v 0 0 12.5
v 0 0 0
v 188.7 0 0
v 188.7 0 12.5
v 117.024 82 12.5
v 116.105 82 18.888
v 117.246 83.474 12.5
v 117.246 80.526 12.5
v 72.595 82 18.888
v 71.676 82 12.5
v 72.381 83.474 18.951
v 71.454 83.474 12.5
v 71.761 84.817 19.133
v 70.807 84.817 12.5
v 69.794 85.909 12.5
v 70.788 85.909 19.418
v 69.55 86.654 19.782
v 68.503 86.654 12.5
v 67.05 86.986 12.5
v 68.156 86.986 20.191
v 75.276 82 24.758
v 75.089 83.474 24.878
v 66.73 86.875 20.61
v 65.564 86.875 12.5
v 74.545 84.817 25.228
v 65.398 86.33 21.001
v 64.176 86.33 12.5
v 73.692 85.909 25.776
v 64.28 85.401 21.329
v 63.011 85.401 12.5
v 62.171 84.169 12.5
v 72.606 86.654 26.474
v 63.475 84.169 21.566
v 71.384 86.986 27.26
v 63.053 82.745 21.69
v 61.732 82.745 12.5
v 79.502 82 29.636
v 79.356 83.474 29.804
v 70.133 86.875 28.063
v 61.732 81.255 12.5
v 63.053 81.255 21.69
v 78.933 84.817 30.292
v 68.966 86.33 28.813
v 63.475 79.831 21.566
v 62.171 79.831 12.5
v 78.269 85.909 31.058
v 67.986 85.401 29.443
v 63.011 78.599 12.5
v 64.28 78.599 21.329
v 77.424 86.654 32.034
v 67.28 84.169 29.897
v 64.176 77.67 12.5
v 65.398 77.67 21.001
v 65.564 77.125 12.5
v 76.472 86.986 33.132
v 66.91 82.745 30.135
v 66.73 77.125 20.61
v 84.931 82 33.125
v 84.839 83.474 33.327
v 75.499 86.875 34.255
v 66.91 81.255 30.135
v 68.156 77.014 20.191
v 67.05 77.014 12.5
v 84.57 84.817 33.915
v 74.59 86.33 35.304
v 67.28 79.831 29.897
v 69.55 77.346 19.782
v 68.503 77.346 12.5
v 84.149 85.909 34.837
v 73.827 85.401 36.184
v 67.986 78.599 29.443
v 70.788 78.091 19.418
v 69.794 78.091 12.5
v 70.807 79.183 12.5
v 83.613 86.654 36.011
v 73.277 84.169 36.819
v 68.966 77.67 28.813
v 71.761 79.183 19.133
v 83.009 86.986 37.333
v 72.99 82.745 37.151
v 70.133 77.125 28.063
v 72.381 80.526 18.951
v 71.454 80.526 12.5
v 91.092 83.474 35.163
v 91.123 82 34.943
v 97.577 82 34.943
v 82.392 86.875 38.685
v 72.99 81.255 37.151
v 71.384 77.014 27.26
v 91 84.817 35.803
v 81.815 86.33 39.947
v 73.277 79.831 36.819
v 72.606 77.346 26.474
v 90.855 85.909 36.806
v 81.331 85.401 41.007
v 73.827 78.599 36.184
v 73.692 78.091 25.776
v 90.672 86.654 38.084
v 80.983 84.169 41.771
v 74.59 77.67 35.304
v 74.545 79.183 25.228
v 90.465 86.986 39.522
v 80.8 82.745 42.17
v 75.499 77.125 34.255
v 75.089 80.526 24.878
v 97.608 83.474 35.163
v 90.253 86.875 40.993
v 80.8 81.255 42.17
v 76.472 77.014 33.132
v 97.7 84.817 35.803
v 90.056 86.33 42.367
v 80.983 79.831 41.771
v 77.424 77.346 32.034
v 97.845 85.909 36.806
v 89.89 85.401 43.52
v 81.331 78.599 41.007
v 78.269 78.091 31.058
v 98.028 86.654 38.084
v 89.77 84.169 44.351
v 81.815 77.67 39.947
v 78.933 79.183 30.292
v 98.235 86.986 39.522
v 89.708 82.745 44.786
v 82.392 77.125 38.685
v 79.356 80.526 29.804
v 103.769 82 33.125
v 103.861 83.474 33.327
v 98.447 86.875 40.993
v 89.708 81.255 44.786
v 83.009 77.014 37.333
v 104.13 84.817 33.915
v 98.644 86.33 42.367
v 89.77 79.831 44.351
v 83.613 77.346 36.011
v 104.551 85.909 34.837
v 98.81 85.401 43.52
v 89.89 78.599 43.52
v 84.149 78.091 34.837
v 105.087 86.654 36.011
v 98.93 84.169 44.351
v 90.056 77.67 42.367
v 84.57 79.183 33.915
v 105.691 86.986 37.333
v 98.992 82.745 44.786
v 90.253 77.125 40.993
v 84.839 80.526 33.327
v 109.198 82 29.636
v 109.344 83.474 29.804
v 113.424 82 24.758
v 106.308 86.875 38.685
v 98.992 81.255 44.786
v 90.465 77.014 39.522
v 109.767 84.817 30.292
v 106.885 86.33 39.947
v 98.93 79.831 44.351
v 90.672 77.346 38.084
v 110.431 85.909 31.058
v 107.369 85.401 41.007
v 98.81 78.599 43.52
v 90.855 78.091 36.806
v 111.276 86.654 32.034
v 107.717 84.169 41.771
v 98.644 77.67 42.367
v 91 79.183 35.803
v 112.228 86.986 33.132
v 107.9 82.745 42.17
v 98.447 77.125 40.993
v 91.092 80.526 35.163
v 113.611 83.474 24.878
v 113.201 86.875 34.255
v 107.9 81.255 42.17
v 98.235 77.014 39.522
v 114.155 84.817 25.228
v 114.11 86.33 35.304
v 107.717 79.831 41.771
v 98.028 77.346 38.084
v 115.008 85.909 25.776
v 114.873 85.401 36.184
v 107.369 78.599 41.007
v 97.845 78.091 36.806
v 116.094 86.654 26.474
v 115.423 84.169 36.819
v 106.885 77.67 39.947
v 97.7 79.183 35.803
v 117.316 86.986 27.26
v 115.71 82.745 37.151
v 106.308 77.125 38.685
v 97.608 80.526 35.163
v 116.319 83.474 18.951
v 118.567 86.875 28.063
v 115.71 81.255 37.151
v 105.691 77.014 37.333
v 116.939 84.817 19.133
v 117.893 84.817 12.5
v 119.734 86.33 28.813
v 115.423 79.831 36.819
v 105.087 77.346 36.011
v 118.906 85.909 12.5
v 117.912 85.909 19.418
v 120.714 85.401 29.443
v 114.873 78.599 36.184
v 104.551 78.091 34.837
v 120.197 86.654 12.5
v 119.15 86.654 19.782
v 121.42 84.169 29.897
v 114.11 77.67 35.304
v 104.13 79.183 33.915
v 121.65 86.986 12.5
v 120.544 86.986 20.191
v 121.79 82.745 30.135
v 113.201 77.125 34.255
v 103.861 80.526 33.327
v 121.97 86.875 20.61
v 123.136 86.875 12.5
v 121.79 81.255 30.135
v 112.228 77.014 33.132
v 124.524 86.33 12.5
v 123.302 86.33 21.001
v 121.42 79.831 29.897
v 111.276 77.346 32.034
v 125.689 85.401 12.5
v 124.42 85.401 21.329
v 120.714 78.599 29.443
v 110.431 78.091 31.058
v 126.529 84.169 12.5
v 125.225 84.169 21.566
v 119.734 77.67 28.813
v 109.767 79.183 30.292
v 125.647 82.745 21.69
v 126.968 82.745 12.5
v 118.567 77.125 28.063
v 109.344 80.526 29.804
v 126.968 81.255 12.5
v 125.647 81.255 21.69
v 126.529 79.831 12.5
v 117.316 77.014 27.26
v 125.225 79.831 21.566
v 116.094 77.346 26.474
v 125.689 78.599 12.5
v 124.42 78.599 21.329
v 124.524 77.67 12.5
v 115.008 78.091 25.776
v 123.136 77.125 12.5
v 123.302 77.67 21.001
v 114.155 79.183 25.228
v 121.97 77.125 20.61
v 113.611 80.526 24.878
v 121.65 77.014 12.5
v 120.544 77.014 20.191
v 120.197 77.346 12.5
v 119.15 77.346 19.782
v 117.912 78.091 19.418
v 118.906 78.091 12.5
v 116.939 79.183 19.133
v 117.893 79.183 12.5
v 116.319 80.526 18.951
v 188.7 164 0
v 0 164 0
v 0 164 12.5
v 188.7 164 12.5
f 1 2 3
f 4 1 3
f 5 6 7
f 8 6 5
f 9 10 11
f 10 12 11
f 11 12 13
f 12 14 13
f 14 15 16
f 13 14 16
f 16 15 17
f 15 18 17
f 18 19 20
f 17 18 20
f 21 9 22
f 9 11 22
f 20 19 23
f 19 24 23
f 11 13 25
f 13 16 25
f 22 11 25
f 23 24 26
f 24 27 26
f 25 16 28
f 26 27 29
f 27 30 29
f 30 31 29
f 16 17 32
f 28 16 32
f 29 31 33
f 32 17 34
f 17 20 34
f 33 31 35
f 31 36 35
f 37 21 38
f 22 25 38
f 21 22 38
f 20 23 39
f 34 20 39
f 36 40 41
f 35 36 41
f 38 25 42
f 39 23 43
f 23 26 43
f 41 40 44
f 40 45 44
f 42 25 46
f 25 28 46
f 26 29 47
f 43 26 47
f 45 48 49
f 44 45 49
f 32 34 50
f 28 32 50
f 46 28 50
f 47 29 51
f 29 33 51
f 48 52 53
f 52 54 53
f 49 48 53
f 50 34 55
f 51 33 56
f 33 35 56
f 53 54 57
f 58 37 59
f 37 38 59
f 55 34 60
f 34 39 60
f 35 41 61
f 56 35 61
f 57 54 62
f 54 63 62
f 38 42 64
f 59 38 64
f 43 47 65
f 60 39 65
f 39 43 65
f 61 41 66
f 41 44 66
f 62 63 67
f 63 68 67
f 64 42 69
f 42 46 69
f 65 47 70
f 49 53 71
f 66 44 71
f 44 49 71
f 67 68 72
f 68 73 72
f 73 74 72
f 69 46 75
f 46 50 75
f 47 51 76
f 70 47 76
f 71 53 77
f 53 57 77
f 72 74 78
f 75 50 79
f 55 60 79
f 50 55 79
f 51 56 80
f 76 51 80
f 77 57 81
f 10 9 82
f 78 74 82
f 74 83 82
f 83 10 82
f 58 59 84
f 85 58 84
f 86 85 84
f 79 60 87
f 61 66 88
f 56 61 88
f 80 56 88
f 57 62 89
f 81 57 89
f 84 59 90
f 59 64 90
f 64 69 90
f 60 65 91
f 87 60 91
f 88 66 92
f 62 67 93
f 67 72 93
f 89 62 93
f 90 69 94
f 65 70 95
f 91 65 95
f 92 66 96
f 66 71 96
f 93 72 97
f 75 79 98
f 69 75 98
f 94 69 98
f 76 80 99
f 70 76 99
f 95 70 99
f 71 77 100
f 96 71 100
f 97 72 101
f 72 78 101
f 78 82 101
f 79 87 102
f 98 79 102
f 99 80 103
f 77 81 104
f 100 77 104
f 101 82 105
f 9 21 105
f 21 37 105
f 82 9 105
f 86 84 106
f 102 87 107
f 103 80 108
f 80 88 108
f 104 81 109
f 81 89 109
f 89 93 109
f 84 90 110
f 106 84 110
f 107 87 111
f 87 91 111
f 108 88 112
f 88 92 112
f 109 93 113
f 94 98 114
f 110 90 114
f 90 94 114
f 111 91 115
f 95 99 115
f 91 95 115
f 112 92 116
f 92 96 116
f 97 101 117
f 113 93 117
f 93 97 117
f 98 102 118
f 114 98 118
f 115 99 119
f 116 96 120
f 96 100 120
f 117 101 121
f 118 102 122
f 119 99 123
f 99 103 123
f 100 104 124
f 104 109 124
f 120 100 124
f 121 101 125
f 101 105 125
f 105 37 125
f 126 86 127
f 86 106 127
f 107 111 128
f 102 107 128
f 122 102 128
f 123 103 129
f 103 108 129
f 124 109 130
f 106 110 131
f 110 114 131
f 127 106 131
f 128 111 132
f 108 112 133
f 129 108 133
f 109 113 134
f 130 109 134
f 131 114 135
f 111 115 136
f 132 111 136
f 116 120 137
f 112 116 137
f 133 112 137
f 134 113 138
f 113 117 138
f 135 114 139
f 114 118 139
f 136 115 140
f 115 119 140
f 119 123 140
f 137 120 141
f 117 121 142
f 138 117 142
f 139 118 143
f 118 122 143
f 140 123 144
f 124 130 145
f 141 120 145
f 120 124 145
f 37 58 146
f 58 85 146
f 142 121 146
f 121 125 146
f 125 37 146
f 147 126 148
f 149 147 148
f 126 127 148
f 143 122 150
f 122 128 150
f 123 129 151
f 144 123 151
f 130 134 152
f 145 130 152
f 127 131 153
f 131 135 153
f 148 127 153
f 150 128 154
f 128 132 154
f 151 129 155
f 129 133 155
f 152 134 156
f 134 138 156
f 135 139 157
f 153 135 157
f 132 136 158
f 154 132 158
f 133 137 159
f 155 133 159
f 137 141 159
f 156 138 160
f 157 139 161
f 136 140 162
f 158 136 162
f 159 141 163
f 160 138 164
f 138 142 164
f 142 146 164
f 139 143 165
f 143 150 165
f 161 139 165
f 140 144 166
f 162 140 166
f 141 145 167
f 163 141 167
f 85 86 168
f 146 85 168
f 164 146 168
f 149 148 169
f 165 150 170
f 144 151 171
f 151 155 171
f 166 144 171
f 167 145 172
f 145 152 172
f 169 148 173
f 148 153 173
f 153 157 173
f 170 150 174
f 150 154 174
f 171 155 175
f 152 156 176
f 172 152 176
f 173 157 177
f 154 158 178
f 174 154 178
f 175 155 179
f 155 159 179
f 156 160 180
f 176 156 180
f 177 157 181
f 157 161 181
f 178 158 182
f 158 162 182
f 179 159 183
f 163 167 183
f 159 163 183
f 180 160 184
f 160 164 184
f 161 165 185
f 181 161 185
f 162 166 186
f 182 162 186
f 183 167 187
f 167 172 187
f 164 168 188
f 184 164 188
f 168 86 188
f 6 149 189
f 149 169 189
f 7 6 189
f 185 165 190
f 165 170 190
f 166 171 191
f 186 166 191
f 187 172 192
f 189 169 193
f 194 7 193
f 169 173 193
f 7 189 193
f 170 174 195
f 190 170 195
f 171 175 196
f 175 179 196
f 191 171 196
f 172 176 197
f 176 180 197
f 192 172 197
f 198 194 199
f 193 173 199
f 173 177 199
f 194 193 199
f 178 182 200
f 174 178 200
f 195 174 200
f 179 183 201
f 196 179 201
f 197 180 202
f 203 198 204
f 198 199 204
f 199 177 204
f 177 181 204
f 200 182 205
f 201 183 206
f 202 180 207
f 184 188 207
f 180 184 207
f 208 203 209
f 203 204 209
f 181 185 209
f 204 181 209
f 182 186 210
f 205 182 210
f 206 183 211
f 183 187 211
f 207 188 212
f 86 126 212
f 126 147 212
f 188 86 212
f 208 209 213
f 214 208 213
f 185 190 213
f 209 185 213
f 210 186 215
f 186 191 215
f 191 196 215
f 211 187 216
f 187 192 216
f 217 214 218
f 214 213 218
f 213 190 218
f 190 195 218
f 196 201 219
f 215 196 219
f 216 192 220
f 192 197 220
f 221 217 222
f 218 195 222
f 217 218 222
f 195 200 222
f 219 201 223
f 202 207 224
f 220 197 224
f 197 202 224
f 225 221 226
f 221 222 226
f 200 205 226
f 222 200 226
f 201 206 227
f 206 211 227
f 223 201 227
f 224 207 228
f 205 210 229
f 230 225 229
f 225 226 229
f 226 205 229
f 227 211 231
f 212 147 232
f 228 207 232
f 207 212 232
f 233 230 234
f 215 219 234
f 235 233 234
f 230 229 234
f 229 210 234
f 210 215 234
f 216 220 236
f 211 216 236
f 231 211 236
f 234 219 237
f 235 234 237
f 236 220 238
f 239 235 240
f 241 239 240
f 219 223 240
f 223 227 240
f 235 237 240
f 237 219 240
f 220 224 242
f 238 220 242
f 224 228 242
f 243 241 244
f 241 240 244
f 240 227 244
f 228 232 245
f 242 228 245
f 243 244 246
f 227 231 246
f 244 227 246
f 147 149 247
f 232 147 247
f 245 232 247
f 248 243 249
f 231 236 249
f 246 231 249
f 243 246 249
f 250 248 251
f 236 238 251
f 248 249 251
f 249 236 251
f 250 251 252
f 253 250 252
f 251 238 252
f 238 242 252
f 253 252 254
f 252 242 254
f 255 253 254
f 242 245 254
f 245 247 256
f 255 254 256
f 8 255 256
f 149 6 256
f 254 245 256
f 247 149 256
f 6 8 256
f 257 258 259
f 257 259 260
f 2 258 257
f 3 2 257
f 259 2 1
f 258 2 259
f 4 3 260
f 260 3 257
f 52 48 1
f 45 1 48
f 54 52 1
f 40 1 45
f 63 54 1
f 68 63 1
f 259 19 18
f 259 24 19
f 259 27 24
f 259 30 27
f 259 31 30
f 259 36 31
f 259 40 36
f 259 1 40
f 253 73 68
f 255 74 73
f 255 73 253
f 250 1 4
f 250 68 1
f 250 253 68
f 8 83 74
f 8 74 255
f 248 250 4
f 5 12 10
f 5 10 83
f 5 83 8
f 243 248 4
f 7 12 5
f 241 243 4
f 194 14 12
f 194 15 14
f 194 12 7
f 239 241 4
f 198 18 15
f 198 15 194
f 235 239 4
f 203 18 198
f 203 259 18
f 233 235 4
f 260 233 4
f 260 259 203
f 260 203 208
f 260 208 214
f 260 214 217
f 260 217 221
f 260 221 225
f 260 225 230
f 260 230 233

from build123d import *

# Parameters (mm, degrees)
SKETCH1_W           = 188.7
SKETCH1_H           = 164
BOSS_EXTRUDE1_DEPTH = 12.5
SKETCH3_R           = 5
REVOLVE1_ANGLE      = 180


with BuildPart() as part:
    # Sketch1 → Boss-Extrude1 (new body)
    with BuildSketch(Plane.XY):
        with Locations((94.35, 82)):
            Rectangle(SKETCH1_W, SKETCH1_H)
    extrude(amount=BOSS_EXTRUDE1_DEPTH)

    # Sketch3 → Revolve1 (revolve)
    with BuildSketch(Plane.XY.offset(12.5)):
        with Locations((66.676185661, 82)):
            Circle(SKETCH3_R)
    revolve(axis=Axis((94.35, 164, 12.5), (0, 1, 0)), revolution_arc=REVOLVE1_ANGLE)


solid = part.part
